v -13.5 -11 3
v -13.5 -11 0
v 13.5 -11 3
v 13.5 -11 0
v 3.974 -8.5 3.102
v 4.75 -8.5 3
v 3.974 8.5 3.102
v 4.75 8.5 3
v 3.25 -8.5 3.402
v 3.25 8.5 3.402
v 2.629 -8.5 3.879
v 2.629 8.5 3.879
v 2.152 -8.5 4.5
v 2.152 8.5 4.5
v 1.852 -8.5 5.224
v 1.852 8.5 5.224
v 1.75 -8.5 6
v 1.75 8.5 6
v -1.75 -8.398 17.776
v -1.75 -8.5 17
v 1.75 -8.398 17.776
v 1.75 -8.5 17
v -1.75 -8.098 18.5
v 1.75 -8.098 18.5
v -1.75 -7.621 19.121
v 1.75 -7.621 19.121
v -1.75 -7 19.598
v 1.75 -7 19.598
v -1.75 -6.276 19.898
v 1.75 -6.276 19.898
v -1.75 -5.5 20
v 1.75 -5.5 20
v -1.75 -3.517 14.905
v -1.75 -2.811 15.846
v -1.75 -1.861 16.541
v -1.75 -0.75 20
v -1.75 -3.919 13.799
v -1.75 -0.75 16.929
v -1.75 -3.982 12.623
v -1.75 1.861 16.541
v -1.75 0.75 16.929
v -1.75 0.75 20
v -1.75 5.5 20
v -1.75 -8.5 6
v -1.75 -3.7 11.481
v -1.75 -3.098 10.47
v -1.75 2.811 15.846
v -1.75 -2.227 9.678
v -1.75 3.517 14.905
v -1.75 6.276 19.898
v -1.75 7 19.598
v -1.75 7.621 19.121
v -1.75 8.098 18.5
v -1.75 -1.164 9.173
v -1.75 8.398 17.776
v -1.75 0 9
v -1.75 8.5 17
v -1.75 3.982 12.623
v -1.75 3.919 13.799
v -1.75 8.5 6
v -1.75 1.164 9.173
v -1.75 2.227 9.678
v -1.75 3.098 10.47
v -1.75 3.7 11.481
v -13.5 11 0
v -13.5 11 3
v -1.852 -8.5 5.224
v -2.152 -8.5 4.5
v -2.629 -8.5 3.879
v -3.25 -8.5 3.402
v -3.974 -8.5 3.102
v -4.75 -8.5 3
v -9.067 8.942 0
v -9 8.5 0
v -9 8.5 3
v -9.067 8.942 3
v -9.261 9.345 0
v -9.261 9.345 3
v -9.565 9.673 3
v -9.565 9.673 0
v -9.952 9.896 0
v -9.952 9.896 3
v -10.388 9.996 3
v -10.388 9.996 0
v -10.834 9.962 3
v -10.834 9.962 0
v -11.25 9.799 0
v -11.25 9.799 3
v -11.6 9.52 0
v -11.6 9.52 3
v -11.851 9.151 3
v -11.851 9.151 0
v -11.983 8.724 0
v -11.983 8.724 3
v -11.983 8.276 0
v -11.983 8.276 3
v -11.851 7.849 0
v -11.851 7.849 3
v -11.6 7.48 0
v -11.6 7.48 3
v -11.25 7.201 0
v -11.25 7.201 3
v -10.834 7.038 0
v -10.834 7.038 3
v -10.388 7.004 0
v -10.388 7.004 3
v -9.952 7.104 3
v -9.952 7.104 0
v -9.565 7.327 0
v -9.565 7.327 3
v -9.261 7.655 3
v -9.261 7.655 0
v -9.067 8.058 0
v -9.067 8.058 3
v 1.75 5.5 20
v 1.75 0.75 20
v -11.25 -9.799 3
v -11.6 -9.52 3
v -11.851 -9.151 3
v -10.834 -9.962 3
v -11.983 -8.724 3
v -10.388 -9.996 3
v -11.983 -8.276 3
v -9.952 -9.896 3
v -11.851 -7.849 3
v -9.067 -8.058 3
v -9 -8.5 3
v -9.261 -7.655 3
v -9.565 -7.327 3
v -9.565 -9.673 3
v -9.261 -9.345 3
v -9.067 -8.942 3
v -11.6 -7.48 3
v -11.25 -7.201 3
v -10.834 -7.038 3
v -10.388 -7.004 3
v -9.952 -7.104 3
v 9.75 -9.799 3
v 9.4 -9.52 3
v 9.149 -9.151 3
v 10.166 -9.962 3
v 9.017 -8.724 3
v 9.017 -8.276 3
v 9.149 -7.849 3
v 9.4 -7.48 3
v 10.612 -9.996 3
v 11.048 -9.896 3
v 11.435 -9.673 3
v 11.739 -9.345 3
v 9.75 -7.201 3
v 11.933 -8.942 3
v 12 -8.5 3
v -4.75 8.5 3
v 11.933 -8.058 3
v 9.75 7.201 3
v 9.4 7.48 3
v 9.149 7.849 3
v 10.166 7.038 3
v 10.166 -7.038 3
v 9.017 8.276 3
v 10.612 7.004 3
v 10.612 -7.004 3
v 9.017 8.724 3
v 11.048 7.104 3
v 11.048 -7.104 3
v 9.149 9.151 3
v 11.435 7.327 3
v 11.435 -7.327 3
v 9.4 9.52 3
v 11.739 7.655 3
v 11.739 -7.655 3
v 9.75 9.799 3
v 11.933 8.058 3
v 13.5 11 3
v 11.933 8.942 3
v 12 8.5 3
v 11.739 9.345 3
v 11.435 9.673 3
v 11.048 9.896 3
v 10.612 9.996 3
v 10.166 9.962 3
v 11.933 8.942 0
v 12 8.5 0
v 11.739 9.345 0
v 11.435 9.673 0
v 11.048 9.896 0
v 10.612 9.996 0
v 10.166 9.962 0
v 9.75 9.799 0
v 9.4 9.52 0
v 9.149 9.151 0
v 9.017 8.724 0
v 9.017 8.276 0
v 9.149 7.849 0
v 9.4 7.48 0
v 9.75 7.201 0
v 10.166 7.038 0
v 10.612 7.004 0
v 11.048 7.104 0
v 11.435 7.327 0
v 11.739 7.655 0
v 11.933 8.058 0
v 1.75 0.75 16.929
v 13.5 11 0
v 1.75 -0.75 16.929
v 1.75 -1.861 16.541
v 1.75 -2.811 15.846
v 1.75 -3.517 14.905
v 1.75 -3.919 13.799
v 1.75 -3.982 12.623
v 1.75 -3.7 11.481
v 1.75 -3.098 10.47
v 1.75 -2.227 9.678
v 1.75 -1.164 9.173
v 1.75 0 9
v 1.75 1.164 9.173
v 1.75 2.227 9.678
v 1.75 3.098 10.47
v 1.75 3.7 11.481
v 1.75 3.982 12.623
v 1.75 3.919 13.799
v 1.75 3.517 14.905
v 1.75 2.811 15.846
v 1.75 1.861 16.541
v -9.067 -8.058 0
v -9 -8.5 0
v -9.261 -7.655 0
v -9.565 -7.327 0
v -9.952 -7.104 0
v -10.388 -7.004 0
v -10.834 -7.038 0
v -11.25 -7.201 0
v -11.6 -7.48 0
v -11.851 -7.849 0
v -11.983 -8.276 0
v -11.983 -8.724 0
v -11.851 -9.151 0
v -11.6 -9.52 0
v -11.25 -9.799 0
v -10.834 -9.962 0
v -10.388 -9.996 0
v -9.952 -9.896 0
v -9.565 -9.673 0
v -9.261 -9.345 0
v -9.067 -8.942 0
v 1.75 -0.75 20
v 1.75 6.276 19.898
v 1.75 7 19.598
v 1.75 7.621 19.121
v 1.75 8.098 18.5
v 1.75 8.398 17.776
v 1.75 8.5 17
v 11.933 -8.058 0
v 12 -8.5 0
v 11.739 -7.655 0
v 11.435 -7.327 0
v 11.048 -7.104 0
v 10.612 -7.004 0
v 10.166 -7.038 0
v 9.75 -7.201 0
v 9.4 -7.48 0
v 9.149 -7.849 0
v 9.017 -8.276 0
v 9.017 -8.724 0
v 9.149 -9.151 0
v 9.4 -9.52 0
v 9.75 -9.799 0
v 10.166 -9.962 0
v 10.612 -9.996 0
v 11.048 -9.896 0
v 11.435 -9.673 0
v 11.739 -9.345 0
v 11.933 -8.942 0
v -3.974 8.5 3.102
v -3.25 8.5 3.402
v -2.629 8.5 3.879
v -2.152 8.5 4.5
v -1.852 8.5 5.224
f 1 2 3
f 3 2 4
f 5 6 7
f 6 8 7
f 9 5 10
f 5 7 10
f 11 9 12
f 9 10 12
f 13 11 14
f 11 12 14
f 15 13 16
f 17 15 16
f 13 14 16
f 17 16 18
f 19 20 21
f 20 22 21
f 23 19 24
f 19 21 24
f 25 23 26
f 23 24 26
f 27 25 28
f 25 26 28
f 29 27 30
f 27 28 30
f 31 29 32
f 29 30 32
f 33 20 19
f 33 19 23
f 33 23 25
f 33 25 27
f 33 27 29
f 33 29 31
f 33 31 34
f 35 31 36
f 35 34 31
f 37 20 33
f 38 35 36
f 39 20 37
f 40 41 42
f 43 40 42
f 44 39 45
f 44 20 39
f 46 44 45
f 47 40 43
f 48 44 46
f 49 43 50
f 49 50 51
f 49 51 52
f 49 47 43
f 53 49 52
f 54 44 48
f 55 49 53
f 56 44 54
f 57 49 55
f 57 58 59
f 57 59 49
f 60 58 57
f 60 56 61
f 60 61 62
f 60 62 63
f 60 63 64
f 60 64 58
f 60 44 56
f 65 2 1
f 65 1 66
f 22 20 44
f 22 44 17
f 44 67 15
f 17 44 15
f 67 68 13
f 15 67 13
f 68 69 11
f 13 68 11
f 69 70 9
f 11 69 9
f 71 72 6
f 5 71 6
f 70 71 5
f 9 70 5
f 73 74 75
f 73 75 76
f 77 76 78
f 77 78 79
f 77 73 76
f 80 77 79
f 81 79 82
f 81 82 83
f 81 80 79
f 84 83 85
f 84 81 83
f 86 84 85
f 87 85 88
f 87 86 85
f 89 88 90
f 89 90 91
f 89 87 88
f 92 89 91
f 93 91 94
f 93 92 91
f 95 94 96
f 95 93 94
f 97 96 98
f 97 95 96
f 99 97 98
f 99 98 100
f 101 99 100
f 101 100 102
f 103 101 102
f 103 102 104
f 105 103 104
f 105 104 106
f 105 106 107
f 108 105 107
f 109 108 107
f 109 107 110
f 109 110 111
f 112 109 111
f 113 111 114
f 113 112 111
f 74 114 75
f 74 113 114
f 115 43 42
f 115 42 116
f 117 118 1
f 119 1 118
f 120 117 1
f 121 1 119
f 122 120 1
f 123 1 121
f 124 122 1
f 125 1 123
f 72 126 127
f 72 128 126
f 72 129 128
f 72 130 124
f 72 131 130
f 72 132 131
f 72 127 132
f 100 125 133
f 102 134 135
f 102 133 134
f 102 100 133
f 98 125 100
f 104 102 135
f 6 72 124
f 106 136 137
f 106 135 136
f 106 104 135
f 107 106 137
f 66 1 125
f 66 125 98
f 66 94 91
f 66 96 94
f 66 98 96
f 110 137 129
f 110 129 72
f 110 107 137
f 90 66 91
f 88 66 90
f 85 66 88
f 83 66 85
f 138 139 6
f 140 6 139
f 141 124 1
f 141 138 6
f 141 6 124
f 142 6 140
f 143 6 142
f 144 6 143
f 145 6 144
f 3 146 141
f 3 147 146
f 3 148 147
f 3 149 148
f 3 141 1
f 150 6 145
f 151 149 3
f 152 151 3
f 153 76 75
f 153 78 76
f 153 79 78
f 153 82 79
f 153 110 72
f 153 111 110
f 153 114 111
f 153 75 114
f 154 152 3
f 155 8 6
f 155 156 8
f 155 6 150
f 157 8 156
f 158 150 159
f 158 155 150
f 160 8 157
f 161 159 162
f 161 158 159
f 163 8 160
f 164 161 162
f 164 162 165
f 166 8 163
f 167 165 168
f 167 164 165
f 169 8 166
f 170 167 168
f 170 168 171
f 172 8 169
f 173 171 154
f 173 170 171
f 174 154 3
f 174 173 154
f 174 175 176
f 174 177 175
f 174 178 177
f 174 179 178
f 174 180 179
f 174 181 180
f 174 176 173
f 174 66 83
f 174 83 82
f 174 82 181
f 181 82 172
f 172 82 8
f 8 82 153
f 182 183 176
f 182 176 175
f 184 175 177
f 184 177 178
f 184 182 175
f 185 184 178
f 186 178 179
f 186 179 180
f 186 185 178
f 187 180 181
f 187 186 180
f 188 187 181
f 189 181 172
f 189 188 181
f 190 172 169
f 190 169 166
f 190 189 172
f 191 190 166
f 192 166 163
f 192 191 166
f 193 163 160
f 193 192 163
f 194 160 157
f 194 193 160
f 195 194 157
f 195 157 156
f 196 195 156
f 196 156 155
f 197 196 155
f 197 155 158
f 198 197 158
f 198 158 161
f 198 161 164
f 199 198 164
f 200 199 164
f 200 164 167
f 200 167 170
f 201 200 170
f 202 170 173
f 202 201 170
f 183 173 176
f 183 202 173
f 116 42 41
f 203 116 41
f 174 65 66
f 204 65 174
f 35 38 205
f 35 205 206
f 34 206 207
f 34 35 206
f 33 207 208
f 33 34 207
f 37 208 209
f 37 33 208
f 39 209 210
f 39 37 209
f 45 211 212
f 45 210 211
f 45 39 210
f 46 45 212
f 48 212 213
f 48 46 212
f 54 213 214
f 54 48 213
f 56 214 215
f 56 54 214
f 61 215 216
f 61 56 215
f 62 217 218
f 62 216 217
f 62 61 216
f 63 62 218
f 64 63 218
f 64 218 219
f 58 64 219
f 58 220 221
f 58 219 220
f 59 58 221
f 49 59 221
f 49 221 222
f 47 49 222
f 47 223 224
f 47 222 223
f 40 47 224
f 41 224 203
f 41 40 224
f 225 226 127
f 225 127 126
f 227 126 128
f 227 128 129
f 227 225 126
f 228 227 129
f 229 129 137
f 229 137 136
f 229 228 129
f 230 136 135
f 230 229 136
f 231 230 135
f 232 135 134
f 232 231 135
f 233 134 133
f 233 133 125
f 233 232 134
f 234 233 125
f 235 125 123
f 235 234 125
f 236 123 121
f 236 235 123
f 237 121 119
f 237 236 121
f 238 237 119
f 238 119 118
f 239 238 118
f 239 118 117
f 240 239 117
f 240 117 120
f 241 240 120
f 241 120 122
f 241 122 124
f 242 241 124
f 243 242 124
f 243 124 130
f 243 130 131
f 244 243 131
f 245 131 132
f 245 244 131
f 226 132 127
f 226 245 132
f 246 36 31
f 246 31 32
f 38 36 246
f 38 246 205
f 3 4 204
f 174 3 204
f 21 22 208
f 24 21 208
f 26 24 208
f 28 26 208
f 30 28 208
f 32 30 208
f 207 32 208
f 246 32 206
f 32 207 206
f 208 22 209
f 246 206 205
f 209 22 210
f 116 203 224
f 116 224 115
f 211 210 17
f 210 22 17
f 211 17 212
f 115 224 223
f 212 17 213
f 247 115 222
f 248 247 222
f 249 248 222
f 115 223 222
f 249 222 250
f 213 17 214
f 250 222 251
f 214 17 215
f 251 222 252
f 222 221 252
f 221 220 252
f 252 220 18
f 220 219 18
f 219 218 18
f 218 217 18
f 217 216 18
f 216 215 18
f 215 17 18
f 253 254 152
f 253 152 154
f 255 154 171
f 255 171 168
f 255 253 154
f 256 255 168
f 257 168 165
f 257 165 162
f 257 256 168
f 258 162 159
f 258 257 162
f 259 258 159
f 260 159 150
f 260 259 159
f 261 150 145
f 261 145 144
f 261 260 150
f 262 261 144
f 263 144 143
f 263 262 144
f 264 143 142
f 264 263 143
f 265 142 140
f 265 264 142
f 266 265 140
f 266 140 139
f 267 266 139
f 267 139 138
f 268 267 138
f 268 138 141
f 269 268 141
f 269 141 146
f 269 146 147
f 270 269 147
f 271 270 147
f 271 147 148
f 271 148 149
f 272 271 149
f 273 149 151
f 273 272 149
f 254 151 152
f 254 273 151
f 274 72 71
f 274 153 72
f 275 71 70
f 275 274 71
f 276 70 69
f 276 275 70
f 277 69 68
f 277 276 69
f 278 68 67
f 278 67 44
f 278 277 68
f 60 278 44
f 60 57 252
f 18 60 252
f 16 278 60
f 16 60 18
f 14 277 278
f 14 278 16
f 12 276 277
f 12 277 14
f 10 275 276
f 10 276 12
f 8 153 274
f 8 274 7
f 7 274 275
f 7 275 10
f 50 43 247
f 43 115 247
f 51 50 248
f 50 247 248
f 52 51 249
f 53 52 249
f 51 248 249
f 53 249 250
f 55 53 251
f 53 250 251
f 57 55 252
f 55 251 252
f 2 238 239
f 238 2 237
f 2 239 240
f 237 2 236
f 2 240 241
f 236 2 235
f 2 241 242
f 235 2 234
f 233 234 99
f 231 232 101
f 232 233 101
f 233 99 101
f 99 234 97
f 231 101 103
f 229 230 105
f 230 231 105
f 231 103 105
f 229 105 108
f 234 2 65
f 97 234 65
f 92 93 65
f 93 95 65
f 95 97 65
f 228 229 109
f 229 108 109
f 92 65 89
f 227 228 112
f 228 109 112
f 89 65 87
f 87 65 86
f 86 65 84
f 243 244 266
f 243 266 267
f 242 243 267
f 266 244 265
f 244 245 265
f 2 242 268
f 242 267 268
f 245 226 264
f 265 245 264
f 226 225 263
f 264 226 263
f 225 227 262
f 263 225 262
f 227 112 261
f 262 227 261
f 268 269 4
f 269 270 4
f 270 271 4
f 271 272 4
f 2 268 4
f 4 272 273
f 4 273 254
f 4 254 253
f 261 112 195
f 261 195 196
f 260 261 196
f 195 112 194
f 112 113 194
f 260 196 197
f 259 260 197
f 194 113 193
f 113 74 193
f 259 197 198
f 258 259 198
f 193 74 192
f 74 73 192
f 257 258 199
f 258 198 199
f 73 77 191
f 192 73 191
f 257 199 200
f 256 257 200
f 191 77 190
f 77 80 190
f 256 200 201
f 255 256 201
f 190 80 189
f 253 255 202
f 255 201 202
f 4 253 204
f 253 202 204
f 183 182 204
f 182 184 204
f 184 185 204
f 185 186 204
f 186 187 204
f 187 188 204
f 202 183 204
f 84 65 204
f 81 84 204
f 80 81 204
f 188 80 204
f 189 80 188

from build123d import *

# Parameters (mm, degrees)
SKETCH1_W               = 27
SKETCH1_H               = 22
SKETCH1_R               = 1.5
BOSS_EXTRUDE1_DEPTH     = 3
SKETCH2_W               = 3.5
SKETCH2_H               = 17
BOSS_EXTRUDE2_DEPTH     = 17
CUT_EXTRUDE1_DEPTH      = 28.451092874
CUT_EXTRUDE1_DEPTH_BACK = 28.451092874
SKETCH3_R               = 4
CUT_EXTRUDE2_DEPTH      = 28.451092874
CUT_EXTRUDE2_DEPTH_BACK = 28.451092874
SKETCH4_W               = 8.09758535
SKETCH4_H               = 1.5
FILLET1_R               = 3
FILLET2_R               = 3


with BuildPart() as part:
    # Sketch1 → Boss-Extrude1 (new body)
    with BuildSketch(Plane.XY):
        Rectangle(SKETCH1_W, SKETCH1_H)
        with Locations((10.5, 8.5)):
            Circle(SKETCH1_R, mode=Mode.SUBTRACT)
        with Locations((10.5, -8.5)):
            Circle(SKETCH1_R, mode=Mode.SUBTRACT)
        with Locations((-10.5, -8.5)):
            Circle(SKETCH1_R, mode=Mode.SUBTRACT)
        with Locations((-10.5, 8.5)):
            Circle(SKETCH1_R, mode=Mode.SUBTRACT)
    extrude(amount=BOSS_EXTRUDE1_DEPTH)

    # Sketch2 → Boss-Extrude2 (add)
    with BuildSketch(Plane.XY.offset(3)):
        Rectangle(SKETCH2_W, SKETCH2_H)
    extrude(amount=BOSS_EXTRUDE2_DEPTH)

    # Sketch3 → Cut-Extrude1 (cut, two sides: drawn at the far end of the back side and taken through both)
    with BuildSketch(Plane(origin=(1.75, 0, 0), x_dir=(0, 0, -1), z_dir=(1, 0, 0)).offset(-CUT_EXTRUDE1_DEPTH_BACK)):
        with Locations(Location((-13, 0, 0), (0, 0, 90))):
            Circle(SKETCH3_R)
    extrude(amount=CUT_EXTRUDE1_DEPTH + CUT_EXTRUDE1_DEPTH_BACK, mode=Mode.SUBTRACT)

    # Sketch4 → Cut-Extrude2 (cut, two sides: drawn at the far end of the back side and taken through both)
    with BuildSketch(Plane(origin=(1.75, 0, 0), x_dir=(0, 0, -1), z_dir=(1, 0, 0)).offset(-CUT_EXTRUDE2_DEPTH_BACK)):
        with Locations((-18.330812417, 0)):
            Rectangle(SKETCH4_W, SKETCH4_H)
    extrude(amount=CUT_EXTRUDE2_DEPTH + CUT_EXTRUDE2_DEPTH_BACK, mode=Mode.SUBTRACT)

    # Fillet1
    fillet1_edges = [part.edges().sort_by_distance(p)[0] for p in [
        (-1.75, 0, 3),
        (1.75, 0, 3),
    ]]
    fillet(fillet1_edges, radius=FILLET1_R)

    # Fillet2
    fillet2_edges = [part.edges().sort_by_distance(p)[0] for p in [
        (0, -8.5, 20),
        (0, 8.5, 20),
    ]]
    fillet(fillet2_edges, radius=FILLET2_R)


solid = part.part
